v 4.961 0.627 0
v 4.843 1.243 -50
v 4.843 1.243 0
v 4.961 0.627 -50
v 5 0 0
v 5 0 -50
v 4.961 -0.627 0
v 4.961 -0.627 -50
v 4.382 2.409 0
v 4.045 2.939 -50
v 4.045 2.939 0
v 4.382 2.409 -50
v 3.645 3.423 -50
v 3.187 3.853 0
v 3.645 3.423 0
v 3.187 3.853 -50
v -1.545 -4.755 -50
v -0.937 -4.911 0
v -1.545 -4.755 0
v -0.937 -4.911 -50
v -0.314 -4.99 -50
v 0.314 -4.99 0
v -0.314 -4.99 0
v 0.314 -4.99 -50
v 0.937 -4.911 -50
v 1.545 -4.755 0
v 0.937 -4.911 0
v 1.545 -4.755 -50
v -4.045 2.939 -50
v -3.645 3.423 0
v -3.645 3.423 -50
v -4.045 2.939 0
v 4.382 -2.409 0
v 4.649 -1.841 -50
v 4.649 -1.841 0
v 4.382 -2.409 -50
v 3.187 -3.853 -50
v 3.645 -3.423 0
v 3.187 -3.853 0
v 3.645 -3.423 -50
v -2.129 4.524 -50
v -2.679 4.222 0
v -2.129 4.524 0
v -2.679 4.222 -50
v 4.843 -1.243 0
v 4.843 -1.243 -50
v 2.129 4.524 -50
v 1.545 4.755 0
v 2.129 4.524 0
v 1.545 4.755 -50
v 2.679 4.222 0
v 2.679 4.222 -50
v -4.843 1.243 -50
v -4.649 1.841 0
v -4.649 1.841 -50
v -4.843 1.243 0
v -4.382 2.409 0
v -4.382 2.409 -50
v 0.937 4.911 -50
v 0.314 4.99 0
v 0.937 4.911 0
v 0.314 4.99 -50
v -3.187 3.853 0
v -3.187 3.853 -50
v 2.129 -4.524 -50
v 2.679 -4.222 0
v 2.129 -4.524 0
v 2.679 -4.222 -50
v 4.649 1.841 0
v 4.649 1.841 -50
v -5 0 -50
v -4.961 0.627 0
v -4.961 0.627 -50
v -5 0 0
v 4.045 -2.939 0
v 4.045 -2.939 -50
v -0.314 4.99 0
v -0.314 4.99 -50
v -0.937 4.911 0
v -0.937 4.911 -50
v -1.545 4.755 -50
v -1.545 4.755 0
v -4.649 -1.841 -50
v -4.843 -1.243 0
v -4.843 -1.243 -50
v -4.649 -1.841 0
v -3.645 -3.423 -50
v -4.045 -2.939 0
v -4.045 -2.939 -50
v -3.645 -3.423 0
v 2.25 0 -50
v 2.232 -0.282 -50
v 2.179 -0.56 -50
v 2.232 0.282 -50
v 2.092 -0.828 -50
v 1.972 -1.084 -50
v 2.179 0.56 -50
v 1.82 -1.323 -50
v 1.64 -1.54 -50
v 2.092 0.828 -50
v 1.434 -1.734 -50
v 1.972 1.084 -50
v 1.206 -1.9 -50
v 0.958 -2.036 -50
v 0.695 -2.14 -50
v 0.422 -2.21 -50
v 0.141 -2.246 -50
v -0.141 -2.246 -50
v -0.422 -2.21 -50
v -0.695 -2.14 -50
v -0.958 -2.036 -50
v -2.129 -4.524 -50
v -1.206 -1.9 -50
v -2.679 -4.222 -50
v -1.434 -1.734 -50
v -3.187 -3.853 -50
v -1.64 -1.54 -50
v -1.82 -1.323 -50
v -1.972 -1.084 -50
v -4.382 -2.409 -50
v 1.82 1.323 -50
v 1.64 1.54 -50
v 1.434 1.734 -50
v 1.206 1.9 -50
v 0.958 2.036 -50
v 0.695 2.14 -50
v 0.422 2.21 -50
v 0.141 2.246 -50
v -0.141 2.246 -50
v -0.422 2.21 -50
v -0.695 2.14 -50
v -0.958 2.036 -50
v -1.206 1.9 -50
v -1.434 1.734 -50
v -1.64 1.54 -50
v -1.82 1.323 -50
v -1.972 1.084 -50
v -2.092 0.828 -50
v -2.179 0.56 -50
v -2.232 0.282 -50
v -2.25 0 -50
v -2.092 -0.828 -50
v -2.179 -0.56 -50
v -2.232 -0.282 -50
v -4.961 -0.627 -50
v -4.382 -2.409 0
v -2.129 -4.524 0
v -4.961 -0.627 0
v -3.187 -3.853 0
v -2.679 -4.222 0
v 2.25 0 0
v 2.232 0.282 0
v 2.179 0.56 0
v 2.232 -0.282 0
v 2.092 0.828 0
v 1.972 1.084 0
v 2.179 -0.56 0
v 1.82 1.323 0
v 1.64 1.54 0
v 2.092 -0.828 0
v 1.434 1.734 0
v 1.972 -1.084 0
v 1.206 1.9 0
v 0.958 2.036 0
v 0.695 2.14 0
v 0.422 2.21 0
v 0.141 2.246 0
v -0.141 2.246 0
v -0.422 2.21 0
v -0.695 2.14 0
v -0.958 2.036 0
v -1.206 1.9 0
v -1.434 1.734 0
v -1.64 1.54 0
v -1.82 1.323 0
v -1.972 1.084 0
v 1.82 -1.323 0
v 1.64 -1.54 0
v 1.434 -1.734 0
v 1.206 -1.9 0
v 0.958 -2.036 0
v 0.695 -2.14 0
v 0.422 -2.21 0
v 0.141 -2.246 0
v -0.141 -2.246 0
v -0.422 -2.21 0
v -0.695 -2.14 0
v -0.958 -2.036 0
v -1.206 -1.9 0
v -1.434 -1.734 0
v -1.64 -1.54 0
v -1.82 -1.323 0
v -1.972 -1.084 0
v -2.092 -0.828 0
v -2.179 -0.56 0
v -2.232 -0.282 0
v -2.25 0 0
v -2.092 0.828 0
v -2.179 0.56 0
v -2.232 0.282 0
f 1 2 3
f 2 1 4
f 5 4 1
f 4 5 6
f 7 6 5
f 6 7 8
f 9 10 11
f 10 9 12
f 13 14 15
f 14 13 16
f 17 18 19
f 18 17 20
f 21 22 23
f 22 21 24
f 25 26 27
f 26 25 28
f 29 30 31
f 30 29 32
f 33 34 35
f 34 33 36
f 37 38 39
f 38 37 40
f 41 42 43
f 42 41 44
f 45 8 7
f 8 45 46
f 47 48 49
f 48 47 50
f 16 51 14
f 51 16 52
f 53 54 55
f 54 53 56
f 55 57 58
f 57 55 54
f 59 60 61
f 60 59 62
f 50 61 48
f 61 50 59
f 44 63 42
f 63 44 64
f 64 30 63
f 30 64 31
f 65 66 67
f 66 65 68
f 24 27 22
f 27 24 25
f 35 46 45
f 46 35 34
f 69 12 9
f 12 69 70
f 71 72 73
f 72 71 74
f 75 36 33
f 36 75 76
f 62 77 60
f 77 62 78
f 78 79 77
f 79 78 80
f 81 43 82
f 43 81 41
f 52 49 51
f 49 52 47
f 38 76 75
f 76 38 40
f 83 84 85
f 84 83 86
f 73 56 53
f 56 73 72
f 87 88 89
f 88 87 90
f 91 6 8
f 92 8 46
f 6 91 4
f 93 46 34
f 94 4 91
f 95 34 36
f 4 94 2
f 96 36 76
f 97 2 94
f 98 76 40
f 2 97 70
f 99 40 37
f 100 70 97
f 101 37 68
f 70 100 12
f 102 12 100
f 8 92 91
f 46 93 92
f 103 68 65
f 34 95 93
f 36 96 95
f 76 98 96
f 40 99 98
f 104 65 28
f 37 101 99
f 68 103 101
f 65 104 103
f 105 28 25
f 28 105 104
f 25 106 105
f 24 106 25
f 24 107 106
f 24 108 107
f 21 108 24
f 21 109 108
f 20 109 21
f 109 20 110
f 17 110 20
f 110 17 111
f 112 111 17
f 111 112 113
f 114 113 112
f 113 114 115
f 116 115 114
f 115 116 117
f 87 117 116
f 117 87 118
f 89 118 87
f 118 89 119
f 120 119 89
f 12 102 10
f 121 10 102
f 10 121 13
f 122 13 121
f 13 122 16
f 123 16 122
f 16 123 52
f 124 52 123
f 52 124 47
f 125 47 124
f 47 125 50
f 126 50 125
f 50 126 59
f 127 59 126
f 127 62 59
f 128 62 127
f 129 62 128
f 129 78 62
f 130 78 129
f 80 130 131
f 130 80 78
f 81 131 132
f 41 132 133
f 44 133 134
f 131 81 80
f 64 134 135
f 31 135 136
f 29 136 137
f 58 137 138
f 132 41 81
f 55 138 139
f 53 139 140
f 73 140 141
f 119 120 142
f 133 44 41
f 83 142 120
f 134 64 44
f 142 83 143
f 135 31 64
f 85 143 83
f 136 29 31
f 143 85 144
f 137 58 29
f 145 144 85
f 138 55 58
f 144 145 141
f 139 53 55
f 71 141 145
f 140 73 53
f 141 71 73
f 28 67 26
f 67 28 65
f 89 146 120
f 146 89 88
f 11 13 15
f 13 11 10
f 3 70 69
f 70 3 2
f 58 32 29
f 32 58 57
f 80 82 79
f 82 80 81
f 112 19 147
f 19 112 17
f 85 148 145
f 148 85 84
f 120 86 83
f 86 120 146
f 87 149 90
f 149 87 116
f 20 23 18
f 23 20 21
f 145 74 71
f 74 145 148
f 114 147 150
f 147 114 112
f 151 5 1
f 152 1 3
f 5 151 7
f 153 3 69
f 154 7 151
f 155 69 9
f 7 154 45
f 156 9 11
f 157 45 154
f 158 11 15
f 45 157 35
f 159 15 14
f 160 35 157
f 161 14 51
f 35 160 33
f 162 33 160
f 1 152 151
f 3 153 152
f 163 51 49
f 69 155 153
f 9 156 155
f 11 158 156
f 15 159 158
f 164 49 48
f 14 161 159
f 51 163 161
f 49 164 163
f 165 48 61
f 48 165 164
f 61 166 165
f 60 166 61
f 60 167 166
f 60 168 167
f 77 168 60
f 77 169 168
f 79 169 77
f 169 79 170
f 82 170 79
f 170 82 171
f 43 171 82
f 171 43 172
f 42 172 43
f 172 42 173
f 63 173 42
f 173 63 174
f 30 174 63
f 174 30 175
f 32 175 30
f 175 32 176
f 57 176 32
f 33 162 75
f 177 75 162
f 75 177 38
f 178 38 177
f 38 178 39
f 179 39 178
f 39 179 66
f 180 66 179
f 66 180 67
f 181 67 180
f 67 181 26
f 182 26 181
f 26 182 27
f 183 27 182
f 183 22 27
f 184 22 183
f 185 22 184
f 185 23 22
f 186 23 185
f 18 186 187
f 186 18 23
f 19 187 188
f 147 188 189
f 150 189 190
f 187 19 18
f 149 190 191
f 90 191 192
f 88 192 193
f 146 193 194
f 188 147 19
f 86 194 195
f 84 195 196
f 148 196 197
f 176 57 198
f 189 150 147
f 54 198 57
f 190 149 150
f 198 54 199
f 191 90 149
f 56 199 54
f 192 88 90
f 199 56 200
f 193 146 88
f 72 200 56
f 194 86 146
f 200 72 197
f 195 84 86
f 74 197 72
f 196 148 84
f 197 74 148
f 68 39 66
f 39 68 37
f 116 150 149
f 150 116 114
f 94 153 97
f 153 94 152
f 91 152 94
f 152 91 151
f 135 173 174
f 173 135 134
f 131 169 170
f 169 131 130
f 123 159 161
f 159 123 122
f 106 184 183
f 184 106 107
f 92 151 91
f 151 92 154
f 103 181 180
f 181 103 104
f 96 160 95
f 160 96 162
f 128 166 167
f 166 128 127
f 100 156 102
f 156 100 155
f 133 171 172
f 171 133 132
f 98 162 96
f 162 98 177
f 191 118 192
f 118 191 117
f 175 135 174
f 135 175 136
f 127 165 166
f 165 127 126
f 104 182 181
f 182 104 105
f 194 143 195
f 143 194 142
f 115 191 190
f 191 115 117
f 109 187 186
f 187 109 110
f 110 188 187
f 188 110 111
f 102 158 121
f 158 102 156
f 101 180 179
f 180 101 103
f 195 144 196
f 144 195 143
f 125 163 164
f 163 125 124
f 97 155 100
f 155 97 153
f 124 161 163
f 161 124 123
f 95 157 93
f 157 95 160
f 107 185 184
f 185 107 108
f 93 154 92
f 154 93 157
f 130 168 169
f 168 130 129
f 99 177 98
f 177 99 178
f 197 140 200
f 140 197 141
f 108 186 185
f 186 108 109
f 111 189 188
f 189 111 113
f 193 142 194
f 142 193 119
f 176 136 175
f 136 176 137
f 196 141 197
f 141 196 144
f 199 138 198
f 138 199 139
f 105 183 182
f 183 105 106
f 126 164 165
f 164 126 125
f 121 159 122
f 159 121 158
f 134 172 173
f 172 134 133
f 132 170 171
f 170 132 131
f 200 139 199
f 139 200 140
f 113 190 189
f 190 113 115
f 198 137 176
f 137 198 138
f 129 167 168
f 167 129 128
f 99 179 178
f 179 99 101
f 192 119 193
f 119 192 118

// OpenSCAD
$fn = 50;


difference() {
	union() {
		translate(v = [0, 0, -50.0000000000]) {
			cylinder(h = 50, r = 5.0000000000);
		}
		cylinder(h = 0, r = 8.0000000000);
	}
	union() {
		#translate(v = [0, 0, -50]) {
			cylinder(h = 50, r = 2.2500000000);
		}
	}
}
